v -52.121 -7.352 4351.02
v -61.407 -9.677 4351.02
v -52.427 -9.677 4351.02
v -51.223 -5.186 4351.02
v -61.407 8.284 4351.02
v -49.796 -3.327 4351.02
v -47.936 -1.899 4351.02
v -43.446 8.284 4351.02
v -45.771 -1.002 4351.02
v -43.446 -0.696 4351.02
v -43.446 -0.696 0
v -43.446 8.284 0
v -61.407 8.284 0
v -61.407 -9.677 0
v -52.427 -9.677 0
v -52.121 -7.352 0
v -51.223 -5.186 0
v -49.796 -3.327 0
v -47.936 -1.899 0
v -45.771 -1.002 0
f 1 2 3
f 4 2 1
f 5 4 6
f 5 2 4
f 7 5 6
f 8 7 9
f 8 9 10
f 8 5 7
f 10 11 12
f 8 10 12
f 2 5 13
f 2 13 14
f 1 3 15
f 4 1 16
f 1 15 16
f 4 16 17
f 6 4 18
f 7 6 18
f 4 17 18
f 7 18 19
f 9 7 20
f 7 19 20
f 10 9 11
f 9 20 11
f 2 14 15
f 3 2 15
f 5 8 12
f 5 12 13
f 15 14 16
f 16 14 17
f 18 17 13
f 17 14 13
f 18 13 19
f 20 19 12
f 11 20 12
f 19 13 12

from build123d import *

# Parameters (mm, degrees)
F1_DEPTH = 4351.019746


with BuildPart() as f1:
    # F0 (on Top) → F1 (new body)
    with BuildSketch(Plane.XY):
        with BuildLine():
            Line((-61.406851, -9.676505), (-52.426595, -9.676505))
            ThreePointArc((-52.426595, -9.676505), (-49.796339, -3.326505), (-43.446339, -0.696249))
            Line((-43.446339, -0.696249), (-43.446339, 8.284007))
            Line((-43.446339, 8.284007), (-61.406851, 8.284007))
            Line((-61.406851, 8.284007), (-61.406851, -9.676505))
        make_face()
    extrude(amount=F1_DEPTH)


solid = f1.part
